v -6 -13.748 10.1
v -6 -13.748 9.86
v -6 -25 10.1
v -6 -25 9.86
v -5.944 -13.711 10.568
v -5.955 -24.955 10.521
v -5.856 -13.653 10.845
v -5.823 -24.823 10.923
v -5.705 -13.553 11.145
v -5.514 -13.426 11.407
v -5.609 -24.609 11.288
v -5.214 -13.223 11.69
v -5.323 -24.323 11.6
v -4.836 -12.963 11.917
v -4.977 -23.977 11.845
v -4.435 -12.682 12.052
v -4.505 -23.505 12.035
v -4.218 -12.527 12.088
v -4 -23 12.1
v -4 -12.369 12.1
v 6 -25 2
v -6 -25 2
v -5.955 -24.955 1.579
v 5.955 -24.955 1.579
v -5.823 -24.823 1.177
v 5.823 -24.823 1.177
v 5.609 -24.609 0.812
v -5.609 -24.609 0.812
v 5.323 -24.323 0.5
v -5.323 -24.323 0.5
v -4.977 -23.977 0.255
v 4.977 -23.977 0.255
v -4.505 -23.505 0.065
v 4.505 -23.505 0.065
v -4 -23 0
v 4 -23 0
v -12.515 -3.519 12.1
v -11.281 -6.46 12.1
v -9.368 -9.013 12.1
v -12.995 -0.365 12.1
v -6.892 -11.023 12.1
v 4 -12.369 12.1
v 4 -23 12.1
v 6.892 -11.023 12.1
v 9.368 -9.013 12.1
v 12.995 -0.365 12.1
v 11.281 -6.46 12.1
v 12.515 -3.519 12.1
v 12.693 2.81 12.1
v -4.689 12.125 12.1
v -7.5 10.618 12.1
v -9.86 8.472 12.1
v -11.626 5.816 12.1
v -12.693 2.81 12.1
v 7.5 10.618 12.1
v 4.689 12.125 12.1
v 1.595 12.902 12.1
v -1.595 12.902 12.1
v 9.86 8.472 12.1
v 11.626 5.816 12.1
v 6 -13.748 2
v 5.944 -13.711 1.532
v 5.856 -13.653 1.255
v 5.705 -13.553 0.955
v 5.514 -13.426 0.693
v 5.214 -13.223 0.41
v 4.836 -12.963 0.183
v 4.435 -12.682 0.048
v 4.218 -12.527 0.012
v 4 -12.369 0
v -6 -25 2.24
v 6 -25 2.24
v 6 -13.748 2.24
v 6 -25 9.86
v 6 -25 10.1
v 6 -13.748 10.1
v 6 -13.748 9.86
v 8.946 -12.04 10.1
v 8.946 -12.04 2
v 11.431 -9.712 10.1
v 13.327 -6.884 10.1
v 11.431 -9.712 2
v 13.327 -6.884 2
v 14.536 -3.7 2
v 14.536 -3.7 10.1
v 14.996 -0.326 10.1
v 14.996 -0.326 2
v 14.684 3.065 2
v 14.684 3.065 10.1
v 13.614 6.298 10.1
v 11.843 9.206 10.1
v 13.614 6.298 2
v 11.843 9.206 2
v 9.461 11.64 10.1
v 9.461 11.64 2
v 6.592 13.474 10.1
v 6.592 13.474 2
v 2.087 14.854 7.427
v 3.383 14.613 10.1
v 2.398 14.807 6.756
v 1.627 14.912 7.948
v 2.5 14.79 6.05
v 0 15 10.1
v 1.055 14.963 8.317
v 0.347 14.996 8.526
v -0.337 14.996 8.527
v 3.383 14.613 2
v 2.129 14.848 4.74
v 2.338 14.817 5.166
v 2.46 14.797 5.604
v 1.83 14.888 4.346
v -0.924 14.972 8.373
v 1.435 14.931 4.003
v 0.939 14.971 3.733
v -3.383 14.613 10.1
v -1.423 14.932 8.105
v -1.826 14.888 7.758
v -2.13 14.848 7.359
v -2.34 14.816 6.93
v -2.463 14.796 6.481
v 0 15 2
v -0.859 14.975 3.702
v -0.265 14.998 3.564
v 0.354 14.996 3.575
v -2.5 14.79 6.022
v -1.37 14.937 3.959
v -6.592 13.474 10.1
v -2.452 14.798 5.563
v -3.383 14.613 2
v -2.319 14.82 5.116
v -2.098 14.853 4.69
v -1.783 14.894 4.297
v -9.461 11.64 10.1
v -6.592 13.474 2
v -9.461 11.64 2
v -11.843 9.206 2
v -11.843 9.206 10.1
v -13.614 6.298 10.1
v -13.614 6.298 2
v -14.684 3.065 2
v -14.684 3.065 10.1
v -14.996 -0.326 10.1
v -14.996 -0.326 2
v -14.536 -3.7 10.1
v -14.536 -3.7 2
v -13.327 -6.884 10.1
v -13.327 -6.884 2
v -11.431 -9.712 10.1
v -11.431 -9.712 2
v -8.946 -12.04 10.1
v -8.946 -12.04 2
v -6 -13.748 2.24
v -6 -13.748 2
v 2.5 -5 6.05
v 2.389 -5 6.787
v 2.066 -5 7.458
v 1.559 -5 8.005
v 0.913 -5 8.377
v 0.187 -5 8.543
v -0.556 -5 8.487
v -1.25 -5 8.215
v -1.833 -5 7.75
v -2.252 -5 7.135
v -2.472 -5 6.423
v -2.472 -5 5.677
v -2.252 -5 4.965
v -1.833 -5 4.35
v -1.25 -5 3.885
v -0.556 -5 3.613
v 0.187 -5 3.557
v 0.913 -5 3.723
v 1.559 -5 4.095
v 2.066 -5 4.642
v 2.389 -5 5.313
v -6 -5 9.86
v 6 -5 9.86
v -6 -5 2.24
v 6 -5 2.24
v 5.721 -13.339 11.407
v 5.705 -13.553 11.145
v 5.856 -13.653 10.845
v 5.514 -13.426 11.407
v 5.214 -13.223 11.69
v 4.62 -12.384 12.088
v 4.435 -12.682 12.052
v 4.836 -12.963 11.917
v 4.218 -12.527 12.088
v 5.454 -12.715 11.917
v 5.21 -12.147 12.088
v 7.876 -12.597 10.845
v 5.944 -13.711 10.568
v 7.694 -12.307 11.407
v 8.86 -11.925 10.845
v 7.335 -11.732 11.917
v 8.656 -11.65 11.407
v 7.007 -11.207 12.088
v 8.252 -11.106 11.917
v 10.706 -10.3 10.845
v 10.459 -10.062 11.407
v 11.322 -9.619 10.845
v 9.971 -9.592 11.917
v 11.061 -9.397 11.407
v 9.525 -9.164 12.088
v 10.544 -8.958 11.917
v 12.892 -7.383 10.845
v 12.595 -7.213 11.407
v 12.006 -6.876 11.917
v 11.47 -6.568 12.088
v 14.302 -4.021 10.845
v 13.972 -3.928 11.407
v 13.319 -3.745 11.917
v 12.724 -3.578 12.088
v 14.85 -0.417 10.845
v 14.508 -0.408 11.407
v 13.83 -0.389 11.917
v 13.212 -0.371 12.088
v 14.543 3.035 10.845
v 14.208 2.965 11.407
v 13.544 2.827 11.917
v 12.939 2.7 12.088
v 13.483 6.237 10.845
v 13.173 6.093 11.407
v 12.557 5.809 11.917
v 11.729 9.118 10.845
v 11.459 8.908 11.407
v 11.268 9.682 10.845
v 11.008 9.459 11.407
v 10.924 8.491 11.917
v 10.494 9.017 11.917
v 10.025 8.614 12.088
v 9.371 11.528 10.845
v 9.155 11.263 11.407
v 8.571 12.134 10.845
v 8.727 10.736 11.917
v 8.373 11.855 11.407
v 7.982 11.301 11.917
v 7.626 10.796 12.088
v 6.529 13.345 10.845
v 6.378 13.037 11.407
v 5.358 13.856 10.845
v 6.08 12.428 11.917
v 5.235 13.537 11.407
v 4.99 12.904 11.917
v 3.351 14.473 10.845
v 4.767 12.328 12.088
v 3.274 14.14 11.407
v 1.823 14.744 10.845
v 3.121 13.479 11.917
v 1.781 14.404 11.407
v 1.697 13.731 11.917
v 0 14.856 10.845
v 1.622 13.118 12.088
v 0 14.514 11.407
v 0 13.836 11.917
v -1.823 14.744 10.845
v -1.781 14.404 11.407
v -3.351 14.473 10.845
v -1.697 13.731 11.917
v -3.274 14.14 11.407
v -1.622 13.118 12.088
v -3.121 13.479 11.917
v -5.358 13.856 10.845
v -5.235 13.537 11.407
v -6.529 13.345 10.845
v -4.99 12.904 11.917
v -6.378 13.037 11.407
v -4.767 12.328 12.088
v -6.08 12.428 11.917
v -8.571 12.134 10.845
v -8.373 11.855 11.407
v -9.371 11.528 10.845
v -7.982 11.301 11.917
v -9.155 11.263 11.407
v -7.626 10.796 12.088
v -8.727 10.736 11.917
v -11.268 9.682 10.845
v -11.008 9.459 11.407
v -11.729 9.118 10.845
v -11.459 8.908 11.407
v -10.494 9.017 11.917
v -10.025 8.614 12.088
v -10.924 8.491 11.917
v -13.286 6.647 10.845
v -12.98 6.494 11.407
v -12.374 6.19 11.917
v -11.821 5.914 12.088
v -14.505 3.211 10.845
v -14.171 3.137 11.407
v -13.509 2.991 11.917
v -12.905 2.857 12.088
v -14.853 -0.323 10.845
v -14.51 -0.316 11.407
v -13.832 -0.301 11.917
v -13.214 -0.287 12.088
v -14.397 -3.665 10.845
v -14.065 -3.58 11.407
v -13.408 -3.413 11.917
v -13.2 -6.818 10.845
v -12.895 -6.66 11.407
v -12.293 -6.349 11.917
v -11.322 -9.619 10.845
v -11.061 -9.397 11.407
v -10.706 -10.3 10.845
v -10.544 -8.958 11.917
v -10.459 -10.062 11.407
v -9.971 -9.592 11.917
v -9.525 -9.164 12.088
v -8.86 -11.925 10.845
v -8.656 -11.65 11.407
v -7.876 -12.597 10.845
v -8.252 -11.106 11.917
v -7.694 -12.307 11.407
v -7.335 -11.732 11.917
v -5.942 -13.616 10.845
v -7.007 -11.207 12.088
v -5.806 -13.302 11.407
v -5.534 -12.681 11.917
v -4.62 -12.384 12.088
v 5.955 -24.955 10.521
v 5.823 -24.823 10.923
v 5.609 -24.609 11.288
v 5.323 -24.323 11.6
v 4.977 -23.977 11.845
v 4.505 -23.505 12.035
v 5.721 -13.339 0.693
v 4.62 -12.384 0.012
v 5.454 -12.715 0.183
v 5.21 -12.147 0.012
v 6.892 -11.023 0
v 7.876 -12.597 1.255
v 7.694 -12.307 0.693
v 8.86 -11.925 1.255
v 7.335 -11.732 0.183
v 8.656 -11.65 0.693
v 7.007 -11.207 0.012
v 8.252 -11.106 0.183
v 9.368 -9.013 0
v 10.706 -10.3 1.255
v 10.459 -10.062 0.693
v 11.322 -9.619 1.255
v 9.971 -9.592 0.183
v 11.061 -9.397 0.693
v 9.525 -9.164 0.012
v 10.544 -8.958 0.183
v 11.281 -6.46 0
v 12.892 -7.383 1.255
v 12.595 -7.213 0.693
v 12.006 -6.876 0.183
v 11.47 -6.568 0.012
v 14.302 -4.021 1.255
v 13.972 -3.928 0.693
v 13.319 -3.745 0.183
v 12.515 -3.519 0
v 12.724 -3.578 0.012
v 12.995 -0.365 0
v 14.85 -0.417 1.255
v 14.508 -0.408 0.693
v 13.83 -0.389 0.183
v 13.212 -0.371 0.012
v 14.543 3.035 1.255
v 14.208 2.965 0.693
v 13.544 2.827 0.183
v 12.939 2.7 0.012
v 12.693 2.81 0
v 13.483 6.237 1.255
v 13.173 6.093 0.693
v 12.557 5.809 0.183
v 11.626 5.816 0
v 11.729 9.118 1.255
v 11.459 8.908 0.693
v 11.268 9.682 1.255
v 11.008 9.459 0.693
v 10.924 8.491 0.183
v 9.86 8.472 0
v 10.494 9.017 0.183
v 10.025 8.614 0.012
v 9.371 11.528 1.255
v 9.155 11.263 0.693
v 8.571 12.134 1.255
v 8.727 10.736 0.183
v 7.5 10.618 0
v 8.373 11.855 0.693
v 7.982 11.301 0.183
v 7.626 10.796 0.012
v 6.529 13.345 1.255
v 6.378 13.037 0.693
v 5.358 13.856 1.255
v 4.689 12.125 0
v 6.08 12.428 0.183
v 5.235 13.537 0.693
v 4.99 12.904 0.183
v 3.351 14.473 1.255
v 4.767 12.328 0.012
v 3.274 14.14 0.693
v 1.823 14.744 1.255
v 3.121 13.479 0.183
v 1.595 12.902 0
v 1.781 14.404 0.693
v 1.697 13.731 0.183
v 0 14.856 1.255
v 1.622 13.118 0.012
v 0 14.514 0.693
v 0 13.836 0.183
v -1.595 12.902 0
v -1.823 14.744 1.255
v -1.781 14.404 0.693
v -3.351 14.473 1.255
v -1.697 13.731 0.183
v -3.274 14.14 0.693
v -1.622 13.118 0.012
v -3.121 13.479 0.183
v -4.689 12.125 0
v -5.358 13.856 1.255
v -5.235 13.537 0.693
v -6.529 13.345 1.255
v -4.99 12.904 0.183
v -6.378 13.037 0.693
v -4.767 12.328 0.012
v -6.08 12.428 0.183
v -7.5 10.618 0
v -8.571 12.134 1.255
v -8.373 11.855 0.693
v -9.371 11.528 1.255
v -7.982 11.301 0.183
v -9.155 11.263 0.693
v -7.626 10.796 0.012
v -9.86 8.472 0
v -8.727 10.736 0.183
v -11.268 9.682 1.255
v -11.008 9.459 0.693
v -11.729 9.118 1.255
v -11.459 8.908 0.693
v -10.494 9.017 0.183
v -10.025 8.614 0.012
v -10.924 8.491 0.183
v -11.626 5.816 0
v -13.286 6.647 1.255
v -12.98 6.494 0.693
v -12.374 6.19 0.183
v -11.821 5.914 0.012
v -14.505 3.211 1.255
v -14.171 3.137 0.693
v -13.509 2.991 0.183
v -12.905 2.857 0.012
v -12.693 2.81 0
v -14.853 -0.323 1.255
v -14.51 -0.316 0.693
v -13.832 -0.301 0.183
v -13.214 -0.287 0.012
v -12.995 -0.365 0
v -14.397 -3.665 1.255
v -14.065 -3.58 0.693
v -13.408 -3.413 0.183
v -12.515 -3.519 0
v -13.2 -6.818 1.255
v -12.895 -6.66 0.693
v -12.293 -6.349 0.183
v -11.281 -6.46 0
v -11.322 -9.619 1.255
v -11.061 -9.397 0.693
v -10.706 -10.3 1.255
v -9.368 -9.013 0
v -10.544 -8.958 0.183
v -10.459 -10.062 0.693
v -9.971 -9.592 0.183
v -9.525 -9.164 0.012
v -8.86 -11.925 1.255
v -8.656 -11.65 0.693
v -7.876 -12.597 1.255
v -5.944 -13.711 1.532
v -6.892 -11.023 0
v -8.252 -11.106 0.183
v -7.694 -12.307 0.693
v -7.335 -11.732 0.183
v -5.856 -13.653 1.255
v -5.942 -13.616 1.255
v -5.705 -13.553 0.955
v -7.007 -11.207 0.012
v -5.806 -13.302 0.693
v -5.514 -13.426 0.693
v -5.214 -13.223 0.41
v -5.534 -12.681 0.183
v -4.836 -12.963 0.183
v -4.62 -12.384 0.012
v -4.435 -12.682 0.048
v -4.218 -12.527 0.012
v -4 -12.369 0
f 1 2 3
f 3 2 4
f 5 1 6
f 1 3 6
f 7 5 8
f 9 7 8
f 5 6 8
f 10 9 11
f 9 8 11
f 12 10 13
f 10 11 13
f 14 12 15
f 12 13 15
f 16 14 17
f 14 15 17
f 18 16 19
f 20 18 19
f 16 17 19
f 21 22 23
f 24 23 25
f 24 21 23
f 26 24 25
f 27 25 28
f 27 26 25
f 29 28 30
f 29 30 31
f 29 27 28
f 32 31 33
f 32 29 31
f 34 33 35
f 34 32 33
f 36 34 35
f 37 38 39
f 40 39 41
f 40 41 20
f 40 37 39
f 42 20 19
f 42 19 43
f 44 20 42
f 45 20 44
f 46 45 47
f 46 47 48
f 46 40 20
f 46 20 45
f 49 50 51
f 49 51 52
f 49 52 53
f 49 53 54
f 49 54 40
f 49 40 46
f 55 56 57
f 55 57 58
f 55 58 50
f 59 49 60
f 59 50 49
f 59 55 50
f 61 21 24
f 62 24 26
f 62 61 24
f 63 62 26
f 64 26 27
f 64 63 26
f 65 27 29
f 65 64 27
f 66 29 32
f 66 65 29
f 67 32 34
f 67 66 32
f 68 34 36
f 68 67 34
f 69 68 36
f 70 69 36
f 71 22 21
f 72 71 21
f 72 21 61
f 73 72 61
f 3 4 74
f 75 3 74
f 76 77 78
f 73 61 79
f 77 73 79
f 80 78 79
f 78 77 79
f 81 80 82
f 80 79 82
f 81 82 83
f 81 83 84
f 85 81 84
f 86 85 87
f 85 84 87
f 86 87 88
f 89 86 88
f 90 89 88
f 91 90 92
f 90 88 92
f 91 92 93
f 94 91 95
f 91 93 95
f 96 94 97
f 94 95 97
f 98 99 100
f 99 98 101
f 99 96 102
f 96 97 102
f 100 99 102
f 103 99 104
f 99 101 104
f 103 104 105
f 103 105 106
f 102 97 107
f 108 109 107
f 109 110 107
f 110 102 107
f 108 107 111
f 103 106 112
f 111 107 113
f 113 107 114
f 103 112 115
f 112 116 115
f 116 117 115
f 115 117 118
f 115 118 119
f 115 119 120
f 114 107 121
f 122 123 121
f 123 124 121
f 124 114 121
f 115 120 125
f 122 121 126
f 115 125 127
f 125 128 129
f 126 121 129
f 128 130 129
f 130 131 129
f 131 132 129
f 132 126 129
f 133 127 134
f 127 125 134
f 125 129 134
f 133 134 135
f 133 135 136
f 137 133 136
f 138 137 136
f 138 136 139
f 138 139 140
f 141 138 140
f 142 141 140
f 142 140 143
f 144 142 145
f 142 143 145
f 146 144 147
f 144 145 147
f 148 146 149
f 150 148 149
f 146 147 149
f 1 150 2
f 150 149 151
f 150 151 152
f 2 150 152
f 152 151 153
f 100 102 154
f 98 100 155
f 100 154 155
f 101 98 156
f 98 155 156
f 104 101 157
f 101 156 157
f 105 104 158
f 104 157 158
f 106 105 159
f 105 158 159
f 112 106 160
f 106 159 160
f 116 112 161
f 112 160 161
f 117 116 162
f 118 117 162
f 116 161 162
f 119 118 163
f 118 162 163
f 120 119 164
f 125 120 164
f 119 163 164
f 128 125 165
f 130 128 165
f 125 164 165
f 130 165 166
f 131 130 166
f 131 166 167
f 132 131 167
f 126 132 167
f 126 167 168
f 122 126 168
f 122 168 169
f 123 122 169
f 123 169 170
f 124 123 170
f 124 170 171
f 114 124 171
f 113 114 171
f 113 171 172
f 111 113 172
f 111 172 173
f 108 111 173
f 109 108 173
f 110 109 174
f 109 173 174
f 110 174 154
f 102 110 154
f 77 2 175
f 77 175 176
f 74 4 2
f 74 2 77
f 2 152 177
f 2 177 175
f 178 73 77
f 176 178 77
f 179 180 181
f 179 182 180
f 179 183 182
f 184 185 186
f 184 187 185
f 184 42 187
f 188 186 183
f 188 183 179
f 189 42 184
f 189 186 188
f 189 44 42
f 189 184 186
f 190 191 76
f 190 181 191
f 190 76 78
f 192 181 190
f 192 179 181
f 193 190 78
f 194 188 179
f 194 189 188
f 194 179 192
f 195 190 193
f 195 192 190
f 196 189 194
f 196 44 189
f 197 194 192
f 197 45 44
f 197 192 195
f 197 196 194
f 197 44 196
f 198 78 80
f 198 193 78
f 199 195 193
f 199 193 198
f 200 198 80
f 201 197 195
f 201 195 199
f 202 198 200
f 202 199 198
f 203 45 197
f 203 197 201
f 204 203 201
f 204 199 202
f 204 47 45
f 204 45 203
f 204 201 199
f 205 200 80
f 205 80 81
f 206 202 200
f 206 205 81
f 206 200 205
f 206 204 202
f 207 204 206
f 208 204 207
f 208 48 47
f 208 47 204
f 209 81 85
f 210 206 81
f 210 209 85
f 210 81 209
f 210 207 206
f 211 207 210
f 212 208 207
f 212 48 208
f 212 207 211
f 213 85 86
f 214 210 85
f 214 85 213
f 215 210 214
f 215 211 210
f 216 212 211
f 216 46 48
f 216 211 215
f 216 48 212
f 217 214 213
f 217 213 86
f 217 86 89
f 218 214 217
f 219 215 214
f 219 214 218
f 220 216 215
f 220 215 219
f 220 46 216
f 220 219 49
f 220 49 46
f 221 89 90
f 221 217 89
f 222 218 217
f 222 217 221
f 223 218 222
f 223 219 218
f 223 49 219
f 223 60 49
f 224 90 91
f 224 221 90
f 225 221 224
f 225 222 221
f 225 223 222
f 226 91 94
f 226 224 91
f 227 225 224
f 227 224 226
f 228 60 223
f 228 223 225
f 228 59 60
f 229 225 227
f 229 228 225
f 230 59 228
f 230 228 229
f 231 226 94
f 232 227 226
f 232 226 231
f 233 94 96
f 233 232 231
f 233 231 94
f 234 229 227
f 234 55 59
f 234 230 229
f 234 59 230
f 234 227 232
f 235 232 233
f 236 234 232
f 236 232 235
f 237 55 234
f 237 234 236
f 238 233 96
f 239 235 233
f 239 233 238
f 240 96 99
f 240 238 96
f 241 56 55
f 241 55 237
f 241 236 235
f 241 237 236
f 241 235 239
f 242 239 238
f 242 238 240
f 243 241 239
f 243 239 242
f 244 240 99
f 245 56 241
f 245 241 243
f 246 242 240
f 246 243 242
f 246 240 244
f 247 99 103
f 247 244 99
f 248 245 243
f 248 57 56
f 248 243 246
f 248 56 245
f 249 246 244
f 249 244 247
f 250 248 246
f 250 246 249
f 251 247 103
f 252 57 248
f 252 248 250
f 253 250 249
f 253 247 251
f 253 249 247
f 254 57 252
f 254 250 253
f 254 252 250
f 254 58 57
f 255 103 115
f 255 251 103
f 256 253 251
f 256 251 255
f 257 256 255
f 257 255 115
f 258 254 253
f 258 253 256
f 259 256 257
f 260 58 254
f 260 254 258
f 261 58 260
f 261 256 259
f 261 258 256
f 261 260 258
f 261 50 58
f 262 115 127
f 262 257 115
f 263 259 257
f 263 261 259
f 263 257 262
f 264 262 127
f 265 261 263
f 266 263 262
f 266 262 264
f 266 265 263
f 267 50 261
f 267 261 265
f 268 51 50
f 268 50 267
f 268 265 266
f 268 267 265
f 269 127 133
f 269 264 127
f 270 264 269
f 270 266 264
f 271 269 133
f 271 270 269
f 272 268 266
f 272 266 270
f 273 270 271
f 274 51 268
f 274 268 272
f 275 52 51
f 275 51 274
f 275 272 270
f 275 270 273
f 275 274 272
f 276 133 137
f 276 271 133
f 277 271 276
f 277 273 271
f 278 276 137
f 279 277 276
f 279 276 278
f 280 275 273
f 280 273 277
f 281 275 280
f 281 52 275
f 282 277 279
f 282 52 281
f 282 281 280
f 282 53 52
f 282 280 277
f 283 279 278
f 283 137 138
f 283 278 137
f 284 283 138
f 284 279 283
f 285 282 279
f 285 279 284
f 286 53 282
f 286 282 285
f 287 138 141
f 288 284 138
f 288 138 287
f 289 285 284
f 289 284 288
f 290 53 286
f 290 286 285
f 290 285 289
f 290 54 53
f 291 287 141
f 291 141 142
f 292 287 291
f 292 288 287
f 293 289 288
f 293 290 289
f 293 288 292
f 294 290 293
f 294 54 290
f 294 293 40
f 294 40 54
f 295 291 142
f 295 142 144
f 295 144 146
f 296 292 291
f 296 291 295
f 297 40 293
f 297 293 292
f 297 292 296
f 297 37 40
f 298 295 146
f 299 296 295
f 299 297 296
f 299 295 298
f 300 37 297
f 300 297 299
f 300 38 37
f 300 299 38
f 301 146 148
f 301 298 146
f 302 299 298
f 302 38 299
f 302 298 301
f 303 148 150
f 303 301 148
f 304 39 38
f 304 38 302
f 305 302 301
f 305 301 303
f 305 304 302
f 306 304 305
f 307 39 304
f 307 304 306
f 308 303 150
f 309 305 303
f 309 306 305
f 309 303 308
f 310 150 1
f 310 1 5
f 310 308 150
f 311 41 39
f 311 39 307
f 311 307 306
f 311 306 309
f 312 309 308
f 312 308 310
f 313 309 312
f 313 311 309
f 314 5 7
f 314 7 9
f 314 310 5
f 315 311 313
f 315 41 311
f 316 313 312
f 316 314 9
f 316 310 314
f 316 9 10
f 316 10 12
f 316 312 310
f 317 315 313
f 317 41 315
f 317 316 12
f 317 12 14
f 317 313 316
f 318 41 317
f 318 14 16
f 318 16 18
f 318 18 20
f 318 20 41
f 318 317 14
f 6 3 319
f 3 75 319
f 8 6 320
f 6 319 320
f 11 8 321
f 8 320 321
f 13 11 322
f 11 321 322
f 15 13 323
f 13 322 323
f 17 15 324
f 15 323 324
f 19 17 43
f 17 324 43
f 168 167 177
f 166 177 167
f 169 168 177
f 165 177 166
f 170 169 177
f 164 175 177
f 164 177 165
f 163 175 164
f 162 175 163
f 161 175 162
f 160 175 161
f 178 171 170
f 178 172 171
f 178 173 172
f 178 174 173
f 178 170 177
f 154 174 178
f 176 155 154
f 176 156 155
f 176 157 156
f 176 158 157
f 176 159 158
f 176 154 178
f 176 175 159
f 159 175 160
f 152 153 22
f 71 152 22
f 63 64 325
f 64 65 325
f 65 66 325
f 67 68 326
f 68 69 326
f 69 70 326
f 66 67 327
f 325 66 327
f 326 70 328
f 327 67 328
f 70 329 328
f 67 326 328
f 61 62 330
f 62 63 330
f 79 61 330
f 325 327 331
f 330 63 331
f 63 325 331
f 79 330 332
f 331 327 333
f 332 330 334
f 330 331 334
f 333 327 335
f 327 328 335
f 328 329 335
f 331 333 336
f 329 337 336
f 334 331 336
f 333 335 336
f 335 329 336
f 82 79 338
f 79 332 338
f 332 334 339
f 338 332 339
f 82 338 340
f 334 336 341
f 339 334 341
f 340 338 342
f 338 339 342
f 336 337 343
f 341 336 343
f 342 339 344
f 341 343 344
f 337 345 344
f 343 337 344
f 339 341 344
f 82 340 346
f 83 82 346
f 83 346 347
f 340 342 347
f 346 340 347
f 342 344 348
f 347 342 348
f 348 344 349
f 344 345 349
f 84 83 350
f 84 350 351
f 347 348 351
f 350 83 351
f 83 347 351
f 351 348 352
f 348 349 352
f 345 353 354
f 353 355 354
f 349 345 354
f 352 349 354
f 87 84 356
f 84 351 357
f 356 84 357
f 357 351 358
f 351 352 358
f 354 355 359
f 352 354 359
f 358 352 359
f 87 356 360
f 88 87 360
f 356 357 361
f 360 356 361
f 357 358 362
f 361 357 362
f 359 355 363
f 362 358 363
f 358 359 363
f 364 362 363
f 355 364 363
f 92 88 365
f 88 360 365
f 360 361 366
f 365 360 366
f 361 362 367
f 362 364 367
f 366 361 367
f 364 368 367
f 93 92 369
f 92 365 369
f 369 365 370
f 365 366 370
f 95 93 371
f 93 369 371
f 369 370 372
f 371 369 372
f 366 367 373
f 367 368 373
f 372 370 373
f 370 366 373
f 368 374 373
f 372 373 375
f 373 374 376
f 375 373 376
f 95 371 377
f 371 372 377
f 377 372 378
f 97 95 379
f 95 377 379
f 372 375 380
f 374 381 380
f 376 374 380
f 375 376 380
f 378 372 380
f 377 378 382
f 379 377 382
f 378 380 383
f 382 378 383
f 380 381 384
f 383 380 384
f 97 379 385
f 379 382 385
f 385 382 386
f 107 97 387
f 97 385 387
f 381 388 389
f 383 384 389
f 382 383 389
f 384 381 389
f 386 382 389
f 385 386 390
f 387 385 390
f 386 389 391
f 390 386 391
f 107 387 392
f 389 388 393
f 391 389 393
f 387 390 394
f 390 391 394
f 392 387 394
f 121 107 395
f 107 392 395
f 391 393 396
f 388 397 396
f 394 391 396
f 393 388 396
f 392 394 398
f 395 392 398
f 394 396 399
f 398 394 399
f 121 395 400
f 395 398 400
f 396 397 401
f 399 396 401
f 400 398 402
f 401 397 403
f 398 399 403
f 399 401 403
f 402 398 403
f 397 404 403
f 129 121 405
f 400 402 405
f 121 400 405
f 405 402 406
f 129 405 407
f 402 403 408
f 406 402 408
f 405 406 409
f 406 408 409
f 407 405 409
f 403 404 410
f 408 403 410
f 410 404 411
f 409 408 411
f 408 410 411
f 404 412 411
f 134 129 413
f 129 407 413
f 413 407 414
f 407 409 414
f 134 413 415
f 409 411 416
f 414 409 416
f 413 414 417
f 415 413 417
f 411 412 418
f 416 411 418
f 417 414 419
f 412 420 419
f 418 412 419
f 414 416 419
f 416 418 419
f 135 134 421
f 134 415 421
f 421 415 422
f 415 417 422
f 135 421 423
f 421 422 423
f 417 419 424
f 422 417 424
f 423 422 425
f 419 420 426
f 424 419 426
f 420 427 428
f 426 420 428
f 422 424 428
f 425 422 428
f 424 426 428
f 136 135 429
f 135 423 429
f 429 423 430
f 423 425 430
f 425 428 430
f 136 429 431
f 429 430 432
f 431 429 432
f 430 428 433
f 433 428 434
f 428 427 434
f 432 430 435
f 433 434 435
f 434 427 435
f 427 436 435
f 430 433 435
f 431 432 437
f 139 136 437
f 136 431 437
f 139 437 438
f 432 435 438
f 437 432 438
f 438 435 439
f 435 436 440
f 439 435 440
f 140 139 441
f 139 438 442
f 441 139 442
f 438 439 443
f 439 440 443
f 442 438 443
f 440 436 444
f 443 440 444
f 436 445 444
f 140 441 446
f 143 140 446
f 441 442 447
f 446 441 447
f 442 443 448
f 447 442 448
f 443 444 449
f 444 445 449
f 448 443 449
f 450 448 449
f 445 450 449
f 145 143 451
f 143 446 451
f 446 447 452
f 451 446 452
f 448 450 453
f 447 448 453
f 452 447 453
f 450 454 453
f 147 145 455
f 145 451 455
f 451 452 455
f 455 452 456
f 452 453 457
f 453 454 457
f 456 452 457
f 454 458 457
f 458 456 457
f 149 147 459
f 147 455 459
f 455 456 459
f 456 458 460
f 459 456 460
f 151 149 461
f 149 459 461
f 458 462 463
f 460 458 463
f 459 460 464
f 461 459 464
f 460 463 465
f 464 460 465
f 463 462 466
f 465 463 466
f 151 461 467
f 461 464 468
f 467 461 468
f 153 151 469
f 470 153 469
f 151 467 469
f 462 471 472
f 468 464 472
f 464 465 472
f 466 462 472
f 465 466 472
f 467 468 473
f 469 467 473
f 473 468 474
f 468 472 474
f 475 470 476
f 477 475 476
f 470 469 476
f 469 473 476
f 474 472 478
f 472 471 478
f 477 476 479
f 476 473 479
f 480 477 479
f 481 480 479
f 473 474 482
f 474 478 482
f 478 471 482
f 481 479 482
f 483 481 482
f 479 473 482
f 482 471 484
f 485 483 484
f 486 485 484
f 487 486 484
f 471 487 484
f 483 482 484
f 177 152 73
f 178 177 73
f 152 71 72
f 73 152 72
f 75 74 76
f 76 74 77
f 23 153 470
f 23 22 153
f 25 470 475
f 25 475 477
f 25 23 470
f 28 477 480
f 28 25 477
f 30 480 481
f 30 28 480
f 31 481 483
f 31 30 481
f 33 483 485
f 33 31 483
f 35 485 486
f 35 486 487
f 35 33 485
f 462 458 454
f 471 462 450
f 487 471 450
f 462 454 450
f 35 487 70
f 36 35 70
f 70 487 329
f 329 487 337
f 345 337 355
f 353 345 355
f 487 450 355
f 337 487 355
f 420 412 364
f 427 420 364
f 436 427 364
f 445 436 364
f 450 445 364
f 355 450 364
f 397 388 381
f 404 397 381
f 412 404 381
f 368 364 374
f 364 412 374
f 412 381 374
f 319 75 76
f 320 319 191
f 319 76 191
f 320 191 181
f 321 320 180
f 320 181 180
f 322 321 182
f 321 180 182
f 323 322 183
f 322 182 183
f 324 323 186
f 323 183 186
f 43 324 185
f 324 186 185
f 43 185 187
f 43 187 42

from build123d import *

# Parameters (mm, degrees)
F1_DEPTH = 12.1
F2_R     = 2
F3_W     = 12
F3_H     = 7.62
F4_DEPTH = 20
F5_R     = 2.5
F6_DEPTH = 33.782


with BuildPart() as f1:
    # F0 (on Top) → F1 (new body)
    with BuildSketch(Plane.XY):
        with BuildLine():
            Line((6, -25), (6, -13.747727))
            ThreePointArc((6, -13.747727), (0, 15), (-6, -13.747727))
            Line((-6, -13.747727), (-6, -25))
            Line((-6, -25), (0, -25))
            Line((0, -25), (6, -25))
        make_face()
    extrude(amount=F1_DEPTH)

    # F2
    f2_edges = [f1.edges().sort_by_distance(p)[0] for p in [
        (0, 15, 12.1),
        (6, -19.373864, 12.1),
        (-6, -19.373864, 12.1),
        (0, -25, 12.1),
        (0, 15, 0),
        (6, -19.373864, 0),
        (-6, -19.373864, 0),
        (0, -25, 0),
    ]]
    fillet(f2_edges, radius=F2_R)

    # F3 (on face) → F4 (cut)
    with BuildSketch(Plane.XZ.offset(25)):
        with Locations((0, 6.05)):
            Rectangle(F3_W, F3_H)
    extrude(amount=-F4_DEPTH, mode=Mode.SUBTRACT)

    # F5 (on face) → F6 (cut)
    with BuildSketch(Plane.XZ.offset(5)):
        with Locations((0, 6.05)):
            Circle(F5_R)
    extrude(amount=-F6_DEPTH, mode=Mode.SUBTRACT)


solid = f1.part
